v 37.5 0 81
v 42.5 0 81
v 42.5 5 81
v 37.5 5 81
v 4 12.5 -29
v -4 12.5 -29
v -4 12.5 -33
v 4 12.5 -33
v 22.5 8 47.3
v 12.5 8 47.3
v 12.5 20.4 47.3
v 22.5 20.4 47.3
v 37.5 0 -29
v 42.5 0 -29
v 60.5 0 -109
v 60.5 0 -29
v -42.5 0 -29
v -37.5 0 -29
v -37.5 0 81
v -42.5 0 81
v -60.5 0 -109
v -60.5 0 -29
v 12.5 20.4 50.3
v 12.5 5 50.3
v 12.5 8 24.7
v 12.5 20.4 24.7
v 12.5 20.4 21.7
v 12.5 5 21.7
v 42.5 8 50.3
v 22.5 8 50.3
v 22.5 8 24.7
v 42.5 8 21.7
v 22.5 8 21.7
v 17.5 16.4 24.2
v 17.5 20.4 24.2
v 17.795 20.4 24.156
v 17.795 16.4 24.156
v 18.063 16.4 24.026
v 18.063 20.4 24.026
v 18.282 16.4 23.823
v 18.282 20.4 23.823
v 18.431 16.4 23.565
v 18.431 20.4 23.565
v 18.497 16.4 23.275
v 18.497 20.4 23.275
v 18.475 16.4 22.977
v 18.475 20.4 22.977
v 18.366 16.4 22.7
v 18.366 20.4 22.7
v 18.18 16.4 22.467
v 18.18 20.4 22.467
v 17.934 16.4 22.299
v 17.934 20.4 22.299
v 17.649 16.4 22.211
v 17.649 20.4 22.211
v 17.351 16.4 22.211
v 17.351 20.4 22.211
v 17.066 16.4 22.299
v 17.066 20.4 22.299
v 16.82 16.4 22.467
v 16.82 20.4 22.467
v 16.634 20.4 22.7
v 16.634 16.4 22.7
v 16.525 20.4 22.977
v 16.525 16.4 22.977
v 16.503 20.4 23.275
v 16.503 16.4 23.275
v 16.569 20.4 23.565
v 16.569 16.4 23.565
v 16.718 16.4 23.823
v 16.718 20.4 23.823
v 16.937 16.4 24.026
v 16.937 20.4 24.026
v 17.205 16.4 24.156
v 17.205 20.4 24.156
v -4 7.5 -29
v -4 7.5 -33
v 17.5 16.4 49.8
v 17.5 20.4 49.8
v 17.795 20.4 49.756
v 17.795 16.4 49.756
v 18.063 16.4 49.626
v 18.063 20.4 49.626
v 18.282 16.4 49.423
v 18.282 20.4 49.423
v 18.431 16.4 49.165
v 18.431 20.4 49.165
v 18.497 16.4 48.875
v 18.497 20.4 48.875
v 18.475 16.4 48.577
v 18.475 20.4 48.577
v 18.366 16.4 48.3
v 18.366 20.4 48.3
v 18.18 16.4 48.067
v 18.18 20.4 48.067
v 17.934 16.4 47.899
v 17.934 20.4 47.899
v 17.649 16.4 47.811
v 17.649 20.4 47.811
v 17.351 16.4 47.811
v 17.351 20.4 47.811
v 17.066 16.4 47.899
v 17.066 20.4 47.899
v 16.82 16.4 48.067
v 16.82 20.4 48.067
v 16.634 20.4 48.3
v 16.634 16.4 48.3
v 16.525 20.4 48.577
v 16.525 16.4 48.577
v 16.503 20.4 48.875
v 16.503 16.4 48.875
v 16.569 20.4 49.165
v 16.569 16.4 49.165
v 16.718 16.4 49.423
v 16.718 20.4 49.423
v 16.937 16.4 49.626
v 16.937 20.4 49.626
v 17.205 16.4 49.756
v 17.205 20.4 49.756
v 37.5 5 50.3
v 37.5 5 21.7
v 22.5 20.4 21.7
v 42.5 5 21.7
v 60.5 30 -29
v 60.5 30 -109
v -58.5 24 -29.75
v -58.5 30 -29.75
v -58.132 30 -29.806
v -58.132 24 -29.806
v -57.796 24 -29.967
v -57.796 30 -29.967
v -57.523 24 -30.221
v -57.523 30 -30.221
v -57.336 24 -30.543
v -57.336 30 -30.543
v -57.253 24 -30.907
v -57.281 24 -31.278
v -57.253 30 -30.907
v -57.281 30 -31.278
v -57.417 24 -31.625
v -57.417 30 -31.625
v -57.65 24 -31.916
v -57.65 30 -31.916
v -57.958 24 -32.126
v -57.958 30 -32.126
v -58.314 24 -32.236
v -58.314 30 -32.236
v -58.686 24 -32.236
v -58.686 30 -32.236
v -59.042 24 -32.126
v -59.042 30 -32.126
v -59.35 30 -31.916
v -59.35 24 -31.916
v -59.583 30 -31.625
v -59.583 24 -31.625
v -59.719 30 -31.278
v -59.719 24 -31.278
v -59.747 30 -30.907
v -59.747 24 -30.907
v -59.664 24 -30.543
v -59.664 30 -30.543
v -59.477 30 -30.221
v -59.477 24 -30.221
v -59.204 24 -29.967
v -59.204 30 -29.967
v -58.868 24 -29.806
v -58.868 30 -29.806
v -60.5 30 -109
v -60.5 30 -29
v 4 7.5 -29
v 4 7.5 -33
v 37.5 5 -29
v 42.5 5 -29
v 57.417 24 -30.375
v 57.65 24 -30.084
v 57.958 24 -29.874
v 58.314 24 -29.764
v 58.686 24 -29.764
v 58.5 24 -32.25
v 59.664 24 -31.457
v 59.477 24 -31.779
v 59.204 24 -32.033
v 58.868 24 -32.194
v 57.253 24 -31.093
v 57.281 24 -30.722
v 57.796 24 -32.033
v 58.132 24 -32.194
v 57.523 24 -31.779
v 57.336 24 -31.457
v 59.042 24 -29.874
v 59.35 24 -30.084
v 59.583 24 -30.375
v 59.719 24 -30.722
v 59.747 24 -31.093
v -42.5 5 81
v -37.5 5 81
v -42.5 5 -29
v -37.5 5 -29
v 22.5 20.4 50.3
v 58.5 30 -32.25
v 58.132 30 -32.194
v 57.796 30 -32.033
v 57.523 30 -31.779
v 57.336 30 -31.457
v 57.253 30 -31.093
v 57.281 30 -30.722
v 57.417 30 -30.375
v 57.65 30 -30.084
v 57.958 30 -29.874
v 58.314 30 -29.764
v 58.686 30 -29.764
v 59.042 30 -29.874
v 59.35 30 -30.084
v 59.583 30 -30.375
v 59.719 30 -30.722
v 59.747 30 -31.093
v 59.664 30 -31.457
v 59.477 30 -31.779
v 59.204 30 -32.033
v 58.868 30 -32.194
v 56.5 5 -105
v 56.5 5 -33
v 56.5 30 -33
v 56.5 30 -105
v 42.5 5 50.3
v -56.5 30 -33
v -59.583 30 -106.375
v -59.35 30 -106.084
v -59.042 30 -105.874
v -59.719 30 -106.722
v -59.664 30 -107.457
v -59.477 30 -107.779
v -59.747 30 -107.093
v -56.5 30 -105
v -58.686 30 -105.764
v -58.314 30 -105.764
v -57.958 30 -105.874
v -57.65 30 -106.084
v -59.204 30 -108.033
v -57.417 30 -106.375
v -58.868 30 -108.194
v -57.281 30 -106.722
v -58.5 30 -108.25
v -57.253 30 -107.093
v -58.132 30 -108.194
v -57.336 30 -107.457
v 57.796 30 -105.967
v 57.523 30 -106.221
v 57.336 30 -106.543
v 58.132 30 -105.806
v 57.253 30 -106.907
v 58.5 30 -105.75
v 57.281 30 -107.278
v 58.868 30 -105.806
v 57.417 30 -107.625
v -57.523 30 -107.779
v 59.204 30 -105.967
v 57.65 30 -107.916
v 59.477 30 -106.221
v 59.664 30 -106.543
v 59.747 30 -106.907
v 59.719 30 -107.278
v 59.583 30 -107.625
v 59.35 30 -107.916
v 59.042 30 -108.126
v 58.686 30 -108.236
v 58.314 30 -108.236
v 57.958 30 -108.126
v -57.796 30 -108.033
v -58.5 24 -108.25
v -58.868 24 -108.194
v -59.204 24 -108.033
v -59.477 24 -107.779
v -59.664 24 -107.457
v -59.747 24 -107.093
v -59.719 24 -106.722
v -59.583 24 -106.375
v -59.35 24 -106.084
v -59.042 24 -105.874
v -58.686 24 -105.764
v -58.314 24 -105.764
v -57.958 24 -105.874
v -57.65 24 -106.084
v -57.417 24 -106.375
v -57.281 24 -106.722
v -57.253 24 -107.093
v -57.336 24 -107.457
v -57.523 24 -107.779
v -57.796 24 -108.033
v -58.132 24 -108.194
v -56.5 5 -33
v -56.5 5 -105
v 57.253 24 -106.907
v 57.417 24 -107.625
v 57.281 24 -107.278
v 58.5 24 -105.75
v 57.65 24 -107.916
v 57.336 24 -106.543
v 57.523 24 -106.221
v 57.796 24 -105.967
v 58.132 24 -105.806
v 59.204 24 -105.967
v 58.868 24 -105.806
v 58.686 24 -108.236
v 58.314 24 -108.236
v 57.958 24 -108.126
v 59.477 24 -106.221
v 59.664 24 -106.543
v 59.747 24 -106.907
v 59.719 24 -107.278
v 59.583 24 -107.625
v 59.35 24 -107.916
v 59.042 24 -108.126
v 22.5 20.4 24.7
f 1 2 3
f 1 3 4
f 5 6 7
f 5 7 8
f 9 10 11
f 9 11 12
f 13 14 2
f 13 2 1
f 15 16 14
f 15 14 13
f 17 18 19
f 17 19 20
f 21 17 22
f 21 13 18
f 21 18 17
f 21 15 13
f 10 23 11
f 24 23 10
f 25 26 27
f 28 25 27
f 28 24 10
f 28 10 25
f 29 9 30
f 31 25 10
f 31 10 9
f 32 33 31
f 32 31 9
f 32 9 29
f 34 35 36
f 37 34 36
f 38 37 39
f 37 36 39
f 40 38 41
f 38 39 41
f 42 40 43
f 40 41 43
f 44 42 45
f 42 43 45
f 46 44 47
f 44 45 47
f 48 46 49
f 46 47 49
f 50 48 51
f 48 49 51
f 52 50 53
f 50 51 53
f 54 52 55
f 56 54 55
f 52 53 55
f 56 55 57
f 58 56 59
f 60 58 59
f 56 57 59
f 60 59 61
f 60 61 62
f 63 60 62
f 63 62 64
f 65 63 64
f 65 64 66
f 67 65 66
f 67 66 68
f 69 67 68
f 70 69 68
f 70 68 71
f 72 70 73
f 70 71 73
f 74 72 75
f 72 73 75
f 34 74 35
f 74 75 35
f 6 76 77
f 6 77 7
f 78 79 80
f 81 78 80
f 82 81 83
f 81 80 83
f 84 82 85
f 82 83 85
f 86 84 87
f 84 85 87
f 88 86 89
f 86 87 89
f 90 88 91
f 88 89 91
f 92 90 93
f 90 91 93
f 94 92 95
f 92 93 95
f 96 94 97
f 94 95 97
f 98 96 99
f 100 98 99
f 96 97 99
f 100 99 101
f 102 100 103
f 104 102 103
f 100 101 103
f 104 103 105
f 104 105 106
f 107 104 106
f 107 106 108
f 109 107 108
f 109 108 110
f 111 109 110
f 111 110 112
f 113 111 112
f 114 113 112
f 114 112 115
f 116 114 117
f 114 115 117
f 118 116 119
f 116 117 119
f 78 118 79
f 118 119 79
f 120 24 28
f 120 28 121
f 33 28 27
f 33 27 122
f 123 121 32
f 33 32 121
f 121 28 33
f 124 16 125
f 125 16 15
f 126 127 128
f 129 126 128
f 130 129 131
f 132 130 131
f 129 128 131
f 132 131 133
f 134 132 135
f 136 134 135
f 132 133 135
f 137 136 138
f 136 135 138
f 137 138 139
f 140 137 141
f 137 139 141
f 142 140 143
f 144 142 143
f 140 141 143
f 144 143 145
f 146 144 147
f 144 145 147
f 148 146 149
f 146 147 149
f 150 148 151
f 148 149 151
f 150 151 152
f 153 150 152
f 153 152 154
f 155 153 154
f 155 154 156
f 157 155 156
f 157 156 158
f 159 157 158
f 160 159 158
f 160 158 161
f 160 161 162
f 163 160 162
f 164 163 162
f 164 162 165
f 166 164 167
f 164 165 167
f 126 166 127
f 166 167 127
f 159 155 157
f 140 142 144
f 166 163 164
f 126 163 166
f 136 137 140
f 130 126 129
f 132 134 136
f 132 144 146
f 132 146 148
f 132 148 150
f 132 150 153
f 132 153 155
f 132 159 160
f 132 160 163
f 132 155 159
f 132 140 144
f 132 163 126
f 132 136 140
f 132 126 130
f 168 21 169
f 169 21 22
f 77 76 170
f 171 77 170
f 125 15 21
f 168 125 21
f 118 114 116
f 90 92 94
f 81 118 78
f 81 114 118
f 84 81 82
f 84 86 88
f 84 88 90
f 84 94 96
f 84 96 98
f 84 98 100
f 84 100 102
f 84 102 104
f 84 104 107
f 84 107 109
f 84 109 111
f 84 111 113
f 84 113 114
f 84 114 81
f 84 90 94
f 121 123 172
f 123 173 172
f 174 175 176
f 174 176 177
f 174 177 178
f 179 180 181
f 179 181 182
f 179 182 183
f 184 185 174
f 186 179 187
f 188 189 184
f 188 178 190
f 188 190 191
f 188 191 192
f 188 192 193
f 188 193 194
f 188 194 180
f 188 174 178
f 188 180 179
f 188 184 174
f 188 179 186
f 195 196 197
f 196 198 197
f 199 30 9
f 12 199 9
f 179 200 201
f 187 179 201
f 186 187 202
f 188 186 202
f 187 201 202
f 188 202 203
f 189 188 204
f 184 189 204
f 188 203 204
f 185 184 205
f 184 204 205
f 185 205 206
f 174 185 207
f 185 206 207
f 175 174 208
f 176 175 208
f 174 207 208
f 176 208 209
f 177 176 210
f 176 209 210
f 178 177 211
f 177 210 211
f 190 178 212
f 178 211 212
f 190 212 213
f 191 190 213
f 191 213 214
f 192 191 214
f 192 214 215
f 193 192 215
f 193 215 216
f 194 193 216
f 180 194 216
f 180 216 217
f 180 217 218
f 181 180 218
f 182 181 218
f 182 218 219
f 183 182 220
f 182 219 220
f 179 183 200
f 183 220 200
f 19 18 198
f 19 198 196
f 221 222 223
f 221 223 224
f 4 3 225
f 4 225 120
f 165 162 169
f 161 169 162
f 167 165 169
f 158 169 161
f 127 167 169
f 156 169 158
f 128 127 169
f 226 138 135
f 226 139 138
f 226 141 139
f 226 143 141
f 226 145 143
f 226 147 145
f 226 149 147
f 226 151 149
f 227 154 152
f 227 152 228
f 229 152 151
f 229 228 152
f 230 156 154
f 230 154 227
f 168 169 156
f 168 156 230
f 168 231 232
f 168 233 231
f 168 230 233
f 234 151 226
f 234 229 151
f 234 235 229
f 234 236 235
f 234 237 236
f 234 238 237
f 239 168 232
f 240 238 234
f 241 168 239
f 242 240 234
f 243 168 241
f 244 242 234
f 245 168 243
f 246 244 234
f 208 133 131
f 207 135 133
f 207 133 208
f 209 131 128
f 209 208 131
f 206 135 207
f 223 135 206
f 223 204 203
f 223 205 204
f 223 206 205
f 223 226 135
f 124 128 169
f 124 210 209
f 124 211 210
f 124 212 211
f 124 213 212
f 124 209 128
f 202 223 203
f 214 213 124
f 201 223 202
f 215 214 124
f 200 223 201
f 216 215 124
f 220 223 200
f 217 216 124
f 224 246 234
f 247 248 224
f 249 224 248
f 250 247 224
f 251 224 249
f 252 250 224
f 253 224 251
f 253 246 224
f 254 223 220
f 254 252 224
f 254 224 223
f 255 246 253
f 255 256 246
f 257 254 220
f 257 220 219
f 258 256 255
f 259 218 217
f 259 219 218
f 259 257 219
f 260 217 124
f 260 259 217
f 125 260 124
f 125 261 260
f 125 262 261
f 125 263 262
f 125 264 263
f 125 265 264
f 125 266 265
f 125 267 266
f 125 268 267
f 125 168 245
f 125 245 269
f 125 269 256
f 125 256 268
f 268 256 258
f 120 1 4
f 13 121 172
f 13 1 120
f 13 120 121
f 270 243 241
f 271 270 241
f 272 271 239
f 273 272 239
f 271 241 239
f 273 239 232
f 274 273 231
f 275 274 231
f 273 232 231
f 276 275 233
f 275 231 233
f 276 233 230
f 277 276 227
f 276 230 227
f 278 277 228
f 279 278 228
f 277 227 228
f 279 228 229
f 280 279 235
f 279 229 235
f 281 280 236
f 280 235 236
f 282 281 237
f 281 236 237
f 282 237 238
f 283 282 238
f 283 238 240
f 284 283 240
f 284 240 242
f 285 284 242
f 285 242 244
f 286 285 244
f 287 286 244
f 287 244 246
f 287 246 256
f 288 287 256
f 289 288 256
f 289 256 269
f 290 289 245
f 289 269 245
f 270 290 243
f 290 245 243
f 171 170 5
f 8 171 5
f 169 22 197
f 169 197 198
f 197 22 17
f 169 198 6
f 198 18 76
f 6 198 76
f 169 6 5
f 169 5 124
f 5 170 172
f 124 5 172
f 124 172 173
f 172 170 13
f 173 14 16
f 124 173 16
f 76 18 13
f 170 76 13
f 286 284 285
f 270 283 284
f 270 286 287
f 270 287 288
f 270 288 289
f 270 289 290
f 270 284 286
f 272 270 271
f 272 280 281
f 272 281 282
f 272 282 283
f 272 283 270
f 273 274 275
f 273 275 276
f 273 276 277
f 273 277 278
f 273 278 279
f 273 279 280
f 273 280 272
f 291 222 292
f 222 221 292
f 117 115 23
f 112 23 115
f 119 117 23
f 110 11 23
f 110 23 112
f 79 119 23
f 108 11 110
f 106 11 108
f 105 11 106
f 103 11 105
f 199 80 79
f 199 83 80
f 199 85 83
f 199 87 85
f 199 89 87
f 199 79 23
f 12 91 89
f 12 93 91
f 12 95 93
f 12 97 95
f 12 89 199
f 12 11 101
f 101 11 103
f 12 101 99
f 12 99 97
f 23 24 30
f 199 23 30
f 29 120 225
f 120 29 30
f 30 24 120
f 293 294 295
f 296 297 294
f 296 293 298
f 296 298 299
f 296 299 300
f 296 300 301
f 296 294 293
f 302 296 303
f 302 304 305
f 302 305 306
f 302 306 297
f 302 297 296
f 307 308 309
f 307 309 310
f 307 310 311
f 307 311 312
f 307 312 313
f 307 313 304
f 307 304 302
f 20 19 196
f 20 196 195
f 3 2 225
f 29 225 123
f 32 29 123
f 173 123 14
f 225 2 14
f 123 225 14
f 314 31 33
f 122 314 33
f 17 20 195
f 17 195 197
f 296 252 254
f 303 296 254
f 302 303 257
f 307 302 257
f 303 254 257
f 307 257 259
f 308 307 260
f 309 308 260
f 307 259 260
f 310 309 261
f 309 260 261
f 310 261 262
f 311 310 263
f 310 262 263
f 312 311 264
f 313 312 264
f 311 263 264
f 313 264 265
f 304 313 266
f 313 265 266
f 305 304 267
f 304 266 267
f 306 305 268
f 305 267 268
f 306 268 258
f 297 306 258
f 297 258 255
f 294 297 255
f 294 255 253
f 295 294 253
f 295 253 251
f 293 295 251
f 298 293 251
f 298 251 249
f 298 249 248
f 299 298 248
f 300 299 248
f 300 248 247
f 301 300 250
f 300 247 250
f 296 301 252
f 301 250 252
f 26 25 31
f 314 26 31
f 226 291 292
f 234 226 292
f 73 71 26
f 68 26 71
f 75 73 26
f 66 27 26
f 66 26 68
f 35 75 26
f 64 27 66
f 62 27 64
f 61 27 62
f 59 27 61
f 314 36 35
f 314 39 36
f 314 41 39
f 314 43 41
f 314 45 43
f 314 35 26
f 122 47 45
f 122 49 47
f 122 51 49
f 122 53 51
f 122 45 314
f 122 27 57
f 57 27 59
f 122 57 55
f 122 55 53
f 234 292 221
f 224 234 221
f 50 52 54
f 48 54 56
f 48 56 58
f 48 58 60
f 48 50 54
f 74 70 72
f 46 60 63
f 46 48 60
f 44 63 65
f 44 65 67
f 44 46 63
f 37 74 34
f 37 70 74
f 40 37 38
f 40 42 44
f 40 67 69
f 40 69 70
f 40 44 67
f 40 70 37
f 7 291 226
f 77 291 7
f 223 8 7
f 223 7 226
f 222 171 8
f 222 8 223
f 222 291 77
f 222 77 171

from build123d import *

# Parameters (mm, degrees)
BOSS_EXTRUDE1_DEPTH = 5
SKETCH2_W           = 113
SKETCH2_H           = 72
BOSS_EXTRUDE2_DEPTH = 25
SKETCH3_R           = 1.25
CUT_EXTRUDE1_DEPTH  = 6
SKETCH4_W           = 30
SKETCH4_H           = 28.6
BOSS_EXTRUDE3_DEPTH = 3
SKETCH5_W           = 10
SKETCH5_H           = 3
BOSS_EXTRUDE4_DEPTH = 12.4
SKETCH6_R           = 1
CUT_EXTRUDE2_DEPTH  = 4
SKETCH12_W          = 8
SKETCH12_H          = 5
CUT_EXTRUDE3_DEPTH  = 21


with BuildPart() as part:
    # Sketch1 → Boss-Extrude1 (new body)
    with BuildSketch(Plane(origin=(0, 0, 0), x_dir=(1, 0, 0), z_dir=(0, 1, 0))):
        Polygon((-42.5, -81), (-42.5, 29), (-60.5, 29), (-60.5, 109), (60.5, 109), (60.5, 29), (42.5, 29), (42.5, -81), (37.5, -81), (37.5, 29), (-37.5, 29), (-37.5, -81), align=None)
    extrude(amount=BOSS_EXTRUDE1_DEPTH)

    # Sketch2 → Boss-Extrude2 (add)
    with BuildSketch(Plane(origin=(0, 5, 0), x_dir=(1, 0, 0), z_dir=(0, 1, 0))):
        Polygon((-60.5, 109), (-60.5, 29), (-42.5, 29), (-37.5, 29), (37.5, 29), (42.5, 29), (60.5, 29), (60.5, 109), align=None)
        with Locations((0, 69)):
            Rectangle(SKETCH2_W, SKETCH2_H, mode=Mode.SUBTRACT)
    extrude(amount=BOSS_EXTRUDE2_DEPTH)

    # Sketch3 → Cut-Extrude1 (cut)
    with BuildSketch(Plane(origin=(0, 30, 0), x_dir=(1, 0, 0), z_dir=(0, 1, 0))):
        with Locations(Location((-58.5, 31, 0), (0, 0, 270))):
            Circle(SKETCH3_R)
        with Locations(Location((58.5, 31, 0), (0, 0, 90))):
            Circle(SKETCH3_R)
        with Locations(Location((-58.5, 107, 0), (0, 0, 90))):
            Circle(SKETCH3_R)
        with Locations(Location((58.5, 107, 0), (0, 0, 270))):
            Circle(SKETCH3_R)
    extrude(amount=-CUT_EXTRUDE1_DEPTH, mode=Mode.SUBTRACT)

    # Sketch4 → Boss-Extrude3 (add)
    with BuildSketch(Plane(origin=(0, 5, 0), x_dir=(1, 0, 0), z_dir=(0, 1, 0))):
        with Locations((27.5, -36)):
            Rectangle(SKETCH4_W, SKETCH4_H)
    extrude(amount=BOSS_EXTRUDE3_DEPTH)

    # Sketch5 → Boss-Extrude4 (add)
    with BuildSketch(Plane(origin=(0, 8, 0), x_dir=(1, 0, 0), z_dir=(0, 1, 0))):
        with Locations((17.5, -23.2)):
            Rectangle(SKETCH5_W, SKETCH5_H)
        with Locations((17.5, -48.8)):
            Rectangle(SKETCH5_W, SKETCH5_H)
    extrude(amount=BOSS_EXTRUDE4_DEPTH)

    # Sketch6 → Cut-Extrude2 (cut)
    with BuildSketch(Plane(origin=(0, 20.4, 0), x_dir=(1, 0, 0), z_dir=(0, 1, 0))):
        with Locations(Location((17.5, -48.8, 0), (0, 0, 270))):
            Circle(SKETCH6_R)
        with Locations(Location((17.5, -23.2, 0), (0, 0, 270))):
            Circle(SKETCH6_R)
    extrude(amount=-CUT_EXTRUDE2_DEPTH, mode=Mode.SUBTRACT)

    # Sketch12 → Cut-Extrude3 (cut)
    with BuildSketch(Plane.XY.offset(-29)):
        with Locations((0, 10)):
            Rectangle(SKETCH12_W, SKETCH12_H)
    extrude(amount=-CUT_EXTRUDE3_DEPTH, mode=Mode.SUBTRACT)


solid = part.part
